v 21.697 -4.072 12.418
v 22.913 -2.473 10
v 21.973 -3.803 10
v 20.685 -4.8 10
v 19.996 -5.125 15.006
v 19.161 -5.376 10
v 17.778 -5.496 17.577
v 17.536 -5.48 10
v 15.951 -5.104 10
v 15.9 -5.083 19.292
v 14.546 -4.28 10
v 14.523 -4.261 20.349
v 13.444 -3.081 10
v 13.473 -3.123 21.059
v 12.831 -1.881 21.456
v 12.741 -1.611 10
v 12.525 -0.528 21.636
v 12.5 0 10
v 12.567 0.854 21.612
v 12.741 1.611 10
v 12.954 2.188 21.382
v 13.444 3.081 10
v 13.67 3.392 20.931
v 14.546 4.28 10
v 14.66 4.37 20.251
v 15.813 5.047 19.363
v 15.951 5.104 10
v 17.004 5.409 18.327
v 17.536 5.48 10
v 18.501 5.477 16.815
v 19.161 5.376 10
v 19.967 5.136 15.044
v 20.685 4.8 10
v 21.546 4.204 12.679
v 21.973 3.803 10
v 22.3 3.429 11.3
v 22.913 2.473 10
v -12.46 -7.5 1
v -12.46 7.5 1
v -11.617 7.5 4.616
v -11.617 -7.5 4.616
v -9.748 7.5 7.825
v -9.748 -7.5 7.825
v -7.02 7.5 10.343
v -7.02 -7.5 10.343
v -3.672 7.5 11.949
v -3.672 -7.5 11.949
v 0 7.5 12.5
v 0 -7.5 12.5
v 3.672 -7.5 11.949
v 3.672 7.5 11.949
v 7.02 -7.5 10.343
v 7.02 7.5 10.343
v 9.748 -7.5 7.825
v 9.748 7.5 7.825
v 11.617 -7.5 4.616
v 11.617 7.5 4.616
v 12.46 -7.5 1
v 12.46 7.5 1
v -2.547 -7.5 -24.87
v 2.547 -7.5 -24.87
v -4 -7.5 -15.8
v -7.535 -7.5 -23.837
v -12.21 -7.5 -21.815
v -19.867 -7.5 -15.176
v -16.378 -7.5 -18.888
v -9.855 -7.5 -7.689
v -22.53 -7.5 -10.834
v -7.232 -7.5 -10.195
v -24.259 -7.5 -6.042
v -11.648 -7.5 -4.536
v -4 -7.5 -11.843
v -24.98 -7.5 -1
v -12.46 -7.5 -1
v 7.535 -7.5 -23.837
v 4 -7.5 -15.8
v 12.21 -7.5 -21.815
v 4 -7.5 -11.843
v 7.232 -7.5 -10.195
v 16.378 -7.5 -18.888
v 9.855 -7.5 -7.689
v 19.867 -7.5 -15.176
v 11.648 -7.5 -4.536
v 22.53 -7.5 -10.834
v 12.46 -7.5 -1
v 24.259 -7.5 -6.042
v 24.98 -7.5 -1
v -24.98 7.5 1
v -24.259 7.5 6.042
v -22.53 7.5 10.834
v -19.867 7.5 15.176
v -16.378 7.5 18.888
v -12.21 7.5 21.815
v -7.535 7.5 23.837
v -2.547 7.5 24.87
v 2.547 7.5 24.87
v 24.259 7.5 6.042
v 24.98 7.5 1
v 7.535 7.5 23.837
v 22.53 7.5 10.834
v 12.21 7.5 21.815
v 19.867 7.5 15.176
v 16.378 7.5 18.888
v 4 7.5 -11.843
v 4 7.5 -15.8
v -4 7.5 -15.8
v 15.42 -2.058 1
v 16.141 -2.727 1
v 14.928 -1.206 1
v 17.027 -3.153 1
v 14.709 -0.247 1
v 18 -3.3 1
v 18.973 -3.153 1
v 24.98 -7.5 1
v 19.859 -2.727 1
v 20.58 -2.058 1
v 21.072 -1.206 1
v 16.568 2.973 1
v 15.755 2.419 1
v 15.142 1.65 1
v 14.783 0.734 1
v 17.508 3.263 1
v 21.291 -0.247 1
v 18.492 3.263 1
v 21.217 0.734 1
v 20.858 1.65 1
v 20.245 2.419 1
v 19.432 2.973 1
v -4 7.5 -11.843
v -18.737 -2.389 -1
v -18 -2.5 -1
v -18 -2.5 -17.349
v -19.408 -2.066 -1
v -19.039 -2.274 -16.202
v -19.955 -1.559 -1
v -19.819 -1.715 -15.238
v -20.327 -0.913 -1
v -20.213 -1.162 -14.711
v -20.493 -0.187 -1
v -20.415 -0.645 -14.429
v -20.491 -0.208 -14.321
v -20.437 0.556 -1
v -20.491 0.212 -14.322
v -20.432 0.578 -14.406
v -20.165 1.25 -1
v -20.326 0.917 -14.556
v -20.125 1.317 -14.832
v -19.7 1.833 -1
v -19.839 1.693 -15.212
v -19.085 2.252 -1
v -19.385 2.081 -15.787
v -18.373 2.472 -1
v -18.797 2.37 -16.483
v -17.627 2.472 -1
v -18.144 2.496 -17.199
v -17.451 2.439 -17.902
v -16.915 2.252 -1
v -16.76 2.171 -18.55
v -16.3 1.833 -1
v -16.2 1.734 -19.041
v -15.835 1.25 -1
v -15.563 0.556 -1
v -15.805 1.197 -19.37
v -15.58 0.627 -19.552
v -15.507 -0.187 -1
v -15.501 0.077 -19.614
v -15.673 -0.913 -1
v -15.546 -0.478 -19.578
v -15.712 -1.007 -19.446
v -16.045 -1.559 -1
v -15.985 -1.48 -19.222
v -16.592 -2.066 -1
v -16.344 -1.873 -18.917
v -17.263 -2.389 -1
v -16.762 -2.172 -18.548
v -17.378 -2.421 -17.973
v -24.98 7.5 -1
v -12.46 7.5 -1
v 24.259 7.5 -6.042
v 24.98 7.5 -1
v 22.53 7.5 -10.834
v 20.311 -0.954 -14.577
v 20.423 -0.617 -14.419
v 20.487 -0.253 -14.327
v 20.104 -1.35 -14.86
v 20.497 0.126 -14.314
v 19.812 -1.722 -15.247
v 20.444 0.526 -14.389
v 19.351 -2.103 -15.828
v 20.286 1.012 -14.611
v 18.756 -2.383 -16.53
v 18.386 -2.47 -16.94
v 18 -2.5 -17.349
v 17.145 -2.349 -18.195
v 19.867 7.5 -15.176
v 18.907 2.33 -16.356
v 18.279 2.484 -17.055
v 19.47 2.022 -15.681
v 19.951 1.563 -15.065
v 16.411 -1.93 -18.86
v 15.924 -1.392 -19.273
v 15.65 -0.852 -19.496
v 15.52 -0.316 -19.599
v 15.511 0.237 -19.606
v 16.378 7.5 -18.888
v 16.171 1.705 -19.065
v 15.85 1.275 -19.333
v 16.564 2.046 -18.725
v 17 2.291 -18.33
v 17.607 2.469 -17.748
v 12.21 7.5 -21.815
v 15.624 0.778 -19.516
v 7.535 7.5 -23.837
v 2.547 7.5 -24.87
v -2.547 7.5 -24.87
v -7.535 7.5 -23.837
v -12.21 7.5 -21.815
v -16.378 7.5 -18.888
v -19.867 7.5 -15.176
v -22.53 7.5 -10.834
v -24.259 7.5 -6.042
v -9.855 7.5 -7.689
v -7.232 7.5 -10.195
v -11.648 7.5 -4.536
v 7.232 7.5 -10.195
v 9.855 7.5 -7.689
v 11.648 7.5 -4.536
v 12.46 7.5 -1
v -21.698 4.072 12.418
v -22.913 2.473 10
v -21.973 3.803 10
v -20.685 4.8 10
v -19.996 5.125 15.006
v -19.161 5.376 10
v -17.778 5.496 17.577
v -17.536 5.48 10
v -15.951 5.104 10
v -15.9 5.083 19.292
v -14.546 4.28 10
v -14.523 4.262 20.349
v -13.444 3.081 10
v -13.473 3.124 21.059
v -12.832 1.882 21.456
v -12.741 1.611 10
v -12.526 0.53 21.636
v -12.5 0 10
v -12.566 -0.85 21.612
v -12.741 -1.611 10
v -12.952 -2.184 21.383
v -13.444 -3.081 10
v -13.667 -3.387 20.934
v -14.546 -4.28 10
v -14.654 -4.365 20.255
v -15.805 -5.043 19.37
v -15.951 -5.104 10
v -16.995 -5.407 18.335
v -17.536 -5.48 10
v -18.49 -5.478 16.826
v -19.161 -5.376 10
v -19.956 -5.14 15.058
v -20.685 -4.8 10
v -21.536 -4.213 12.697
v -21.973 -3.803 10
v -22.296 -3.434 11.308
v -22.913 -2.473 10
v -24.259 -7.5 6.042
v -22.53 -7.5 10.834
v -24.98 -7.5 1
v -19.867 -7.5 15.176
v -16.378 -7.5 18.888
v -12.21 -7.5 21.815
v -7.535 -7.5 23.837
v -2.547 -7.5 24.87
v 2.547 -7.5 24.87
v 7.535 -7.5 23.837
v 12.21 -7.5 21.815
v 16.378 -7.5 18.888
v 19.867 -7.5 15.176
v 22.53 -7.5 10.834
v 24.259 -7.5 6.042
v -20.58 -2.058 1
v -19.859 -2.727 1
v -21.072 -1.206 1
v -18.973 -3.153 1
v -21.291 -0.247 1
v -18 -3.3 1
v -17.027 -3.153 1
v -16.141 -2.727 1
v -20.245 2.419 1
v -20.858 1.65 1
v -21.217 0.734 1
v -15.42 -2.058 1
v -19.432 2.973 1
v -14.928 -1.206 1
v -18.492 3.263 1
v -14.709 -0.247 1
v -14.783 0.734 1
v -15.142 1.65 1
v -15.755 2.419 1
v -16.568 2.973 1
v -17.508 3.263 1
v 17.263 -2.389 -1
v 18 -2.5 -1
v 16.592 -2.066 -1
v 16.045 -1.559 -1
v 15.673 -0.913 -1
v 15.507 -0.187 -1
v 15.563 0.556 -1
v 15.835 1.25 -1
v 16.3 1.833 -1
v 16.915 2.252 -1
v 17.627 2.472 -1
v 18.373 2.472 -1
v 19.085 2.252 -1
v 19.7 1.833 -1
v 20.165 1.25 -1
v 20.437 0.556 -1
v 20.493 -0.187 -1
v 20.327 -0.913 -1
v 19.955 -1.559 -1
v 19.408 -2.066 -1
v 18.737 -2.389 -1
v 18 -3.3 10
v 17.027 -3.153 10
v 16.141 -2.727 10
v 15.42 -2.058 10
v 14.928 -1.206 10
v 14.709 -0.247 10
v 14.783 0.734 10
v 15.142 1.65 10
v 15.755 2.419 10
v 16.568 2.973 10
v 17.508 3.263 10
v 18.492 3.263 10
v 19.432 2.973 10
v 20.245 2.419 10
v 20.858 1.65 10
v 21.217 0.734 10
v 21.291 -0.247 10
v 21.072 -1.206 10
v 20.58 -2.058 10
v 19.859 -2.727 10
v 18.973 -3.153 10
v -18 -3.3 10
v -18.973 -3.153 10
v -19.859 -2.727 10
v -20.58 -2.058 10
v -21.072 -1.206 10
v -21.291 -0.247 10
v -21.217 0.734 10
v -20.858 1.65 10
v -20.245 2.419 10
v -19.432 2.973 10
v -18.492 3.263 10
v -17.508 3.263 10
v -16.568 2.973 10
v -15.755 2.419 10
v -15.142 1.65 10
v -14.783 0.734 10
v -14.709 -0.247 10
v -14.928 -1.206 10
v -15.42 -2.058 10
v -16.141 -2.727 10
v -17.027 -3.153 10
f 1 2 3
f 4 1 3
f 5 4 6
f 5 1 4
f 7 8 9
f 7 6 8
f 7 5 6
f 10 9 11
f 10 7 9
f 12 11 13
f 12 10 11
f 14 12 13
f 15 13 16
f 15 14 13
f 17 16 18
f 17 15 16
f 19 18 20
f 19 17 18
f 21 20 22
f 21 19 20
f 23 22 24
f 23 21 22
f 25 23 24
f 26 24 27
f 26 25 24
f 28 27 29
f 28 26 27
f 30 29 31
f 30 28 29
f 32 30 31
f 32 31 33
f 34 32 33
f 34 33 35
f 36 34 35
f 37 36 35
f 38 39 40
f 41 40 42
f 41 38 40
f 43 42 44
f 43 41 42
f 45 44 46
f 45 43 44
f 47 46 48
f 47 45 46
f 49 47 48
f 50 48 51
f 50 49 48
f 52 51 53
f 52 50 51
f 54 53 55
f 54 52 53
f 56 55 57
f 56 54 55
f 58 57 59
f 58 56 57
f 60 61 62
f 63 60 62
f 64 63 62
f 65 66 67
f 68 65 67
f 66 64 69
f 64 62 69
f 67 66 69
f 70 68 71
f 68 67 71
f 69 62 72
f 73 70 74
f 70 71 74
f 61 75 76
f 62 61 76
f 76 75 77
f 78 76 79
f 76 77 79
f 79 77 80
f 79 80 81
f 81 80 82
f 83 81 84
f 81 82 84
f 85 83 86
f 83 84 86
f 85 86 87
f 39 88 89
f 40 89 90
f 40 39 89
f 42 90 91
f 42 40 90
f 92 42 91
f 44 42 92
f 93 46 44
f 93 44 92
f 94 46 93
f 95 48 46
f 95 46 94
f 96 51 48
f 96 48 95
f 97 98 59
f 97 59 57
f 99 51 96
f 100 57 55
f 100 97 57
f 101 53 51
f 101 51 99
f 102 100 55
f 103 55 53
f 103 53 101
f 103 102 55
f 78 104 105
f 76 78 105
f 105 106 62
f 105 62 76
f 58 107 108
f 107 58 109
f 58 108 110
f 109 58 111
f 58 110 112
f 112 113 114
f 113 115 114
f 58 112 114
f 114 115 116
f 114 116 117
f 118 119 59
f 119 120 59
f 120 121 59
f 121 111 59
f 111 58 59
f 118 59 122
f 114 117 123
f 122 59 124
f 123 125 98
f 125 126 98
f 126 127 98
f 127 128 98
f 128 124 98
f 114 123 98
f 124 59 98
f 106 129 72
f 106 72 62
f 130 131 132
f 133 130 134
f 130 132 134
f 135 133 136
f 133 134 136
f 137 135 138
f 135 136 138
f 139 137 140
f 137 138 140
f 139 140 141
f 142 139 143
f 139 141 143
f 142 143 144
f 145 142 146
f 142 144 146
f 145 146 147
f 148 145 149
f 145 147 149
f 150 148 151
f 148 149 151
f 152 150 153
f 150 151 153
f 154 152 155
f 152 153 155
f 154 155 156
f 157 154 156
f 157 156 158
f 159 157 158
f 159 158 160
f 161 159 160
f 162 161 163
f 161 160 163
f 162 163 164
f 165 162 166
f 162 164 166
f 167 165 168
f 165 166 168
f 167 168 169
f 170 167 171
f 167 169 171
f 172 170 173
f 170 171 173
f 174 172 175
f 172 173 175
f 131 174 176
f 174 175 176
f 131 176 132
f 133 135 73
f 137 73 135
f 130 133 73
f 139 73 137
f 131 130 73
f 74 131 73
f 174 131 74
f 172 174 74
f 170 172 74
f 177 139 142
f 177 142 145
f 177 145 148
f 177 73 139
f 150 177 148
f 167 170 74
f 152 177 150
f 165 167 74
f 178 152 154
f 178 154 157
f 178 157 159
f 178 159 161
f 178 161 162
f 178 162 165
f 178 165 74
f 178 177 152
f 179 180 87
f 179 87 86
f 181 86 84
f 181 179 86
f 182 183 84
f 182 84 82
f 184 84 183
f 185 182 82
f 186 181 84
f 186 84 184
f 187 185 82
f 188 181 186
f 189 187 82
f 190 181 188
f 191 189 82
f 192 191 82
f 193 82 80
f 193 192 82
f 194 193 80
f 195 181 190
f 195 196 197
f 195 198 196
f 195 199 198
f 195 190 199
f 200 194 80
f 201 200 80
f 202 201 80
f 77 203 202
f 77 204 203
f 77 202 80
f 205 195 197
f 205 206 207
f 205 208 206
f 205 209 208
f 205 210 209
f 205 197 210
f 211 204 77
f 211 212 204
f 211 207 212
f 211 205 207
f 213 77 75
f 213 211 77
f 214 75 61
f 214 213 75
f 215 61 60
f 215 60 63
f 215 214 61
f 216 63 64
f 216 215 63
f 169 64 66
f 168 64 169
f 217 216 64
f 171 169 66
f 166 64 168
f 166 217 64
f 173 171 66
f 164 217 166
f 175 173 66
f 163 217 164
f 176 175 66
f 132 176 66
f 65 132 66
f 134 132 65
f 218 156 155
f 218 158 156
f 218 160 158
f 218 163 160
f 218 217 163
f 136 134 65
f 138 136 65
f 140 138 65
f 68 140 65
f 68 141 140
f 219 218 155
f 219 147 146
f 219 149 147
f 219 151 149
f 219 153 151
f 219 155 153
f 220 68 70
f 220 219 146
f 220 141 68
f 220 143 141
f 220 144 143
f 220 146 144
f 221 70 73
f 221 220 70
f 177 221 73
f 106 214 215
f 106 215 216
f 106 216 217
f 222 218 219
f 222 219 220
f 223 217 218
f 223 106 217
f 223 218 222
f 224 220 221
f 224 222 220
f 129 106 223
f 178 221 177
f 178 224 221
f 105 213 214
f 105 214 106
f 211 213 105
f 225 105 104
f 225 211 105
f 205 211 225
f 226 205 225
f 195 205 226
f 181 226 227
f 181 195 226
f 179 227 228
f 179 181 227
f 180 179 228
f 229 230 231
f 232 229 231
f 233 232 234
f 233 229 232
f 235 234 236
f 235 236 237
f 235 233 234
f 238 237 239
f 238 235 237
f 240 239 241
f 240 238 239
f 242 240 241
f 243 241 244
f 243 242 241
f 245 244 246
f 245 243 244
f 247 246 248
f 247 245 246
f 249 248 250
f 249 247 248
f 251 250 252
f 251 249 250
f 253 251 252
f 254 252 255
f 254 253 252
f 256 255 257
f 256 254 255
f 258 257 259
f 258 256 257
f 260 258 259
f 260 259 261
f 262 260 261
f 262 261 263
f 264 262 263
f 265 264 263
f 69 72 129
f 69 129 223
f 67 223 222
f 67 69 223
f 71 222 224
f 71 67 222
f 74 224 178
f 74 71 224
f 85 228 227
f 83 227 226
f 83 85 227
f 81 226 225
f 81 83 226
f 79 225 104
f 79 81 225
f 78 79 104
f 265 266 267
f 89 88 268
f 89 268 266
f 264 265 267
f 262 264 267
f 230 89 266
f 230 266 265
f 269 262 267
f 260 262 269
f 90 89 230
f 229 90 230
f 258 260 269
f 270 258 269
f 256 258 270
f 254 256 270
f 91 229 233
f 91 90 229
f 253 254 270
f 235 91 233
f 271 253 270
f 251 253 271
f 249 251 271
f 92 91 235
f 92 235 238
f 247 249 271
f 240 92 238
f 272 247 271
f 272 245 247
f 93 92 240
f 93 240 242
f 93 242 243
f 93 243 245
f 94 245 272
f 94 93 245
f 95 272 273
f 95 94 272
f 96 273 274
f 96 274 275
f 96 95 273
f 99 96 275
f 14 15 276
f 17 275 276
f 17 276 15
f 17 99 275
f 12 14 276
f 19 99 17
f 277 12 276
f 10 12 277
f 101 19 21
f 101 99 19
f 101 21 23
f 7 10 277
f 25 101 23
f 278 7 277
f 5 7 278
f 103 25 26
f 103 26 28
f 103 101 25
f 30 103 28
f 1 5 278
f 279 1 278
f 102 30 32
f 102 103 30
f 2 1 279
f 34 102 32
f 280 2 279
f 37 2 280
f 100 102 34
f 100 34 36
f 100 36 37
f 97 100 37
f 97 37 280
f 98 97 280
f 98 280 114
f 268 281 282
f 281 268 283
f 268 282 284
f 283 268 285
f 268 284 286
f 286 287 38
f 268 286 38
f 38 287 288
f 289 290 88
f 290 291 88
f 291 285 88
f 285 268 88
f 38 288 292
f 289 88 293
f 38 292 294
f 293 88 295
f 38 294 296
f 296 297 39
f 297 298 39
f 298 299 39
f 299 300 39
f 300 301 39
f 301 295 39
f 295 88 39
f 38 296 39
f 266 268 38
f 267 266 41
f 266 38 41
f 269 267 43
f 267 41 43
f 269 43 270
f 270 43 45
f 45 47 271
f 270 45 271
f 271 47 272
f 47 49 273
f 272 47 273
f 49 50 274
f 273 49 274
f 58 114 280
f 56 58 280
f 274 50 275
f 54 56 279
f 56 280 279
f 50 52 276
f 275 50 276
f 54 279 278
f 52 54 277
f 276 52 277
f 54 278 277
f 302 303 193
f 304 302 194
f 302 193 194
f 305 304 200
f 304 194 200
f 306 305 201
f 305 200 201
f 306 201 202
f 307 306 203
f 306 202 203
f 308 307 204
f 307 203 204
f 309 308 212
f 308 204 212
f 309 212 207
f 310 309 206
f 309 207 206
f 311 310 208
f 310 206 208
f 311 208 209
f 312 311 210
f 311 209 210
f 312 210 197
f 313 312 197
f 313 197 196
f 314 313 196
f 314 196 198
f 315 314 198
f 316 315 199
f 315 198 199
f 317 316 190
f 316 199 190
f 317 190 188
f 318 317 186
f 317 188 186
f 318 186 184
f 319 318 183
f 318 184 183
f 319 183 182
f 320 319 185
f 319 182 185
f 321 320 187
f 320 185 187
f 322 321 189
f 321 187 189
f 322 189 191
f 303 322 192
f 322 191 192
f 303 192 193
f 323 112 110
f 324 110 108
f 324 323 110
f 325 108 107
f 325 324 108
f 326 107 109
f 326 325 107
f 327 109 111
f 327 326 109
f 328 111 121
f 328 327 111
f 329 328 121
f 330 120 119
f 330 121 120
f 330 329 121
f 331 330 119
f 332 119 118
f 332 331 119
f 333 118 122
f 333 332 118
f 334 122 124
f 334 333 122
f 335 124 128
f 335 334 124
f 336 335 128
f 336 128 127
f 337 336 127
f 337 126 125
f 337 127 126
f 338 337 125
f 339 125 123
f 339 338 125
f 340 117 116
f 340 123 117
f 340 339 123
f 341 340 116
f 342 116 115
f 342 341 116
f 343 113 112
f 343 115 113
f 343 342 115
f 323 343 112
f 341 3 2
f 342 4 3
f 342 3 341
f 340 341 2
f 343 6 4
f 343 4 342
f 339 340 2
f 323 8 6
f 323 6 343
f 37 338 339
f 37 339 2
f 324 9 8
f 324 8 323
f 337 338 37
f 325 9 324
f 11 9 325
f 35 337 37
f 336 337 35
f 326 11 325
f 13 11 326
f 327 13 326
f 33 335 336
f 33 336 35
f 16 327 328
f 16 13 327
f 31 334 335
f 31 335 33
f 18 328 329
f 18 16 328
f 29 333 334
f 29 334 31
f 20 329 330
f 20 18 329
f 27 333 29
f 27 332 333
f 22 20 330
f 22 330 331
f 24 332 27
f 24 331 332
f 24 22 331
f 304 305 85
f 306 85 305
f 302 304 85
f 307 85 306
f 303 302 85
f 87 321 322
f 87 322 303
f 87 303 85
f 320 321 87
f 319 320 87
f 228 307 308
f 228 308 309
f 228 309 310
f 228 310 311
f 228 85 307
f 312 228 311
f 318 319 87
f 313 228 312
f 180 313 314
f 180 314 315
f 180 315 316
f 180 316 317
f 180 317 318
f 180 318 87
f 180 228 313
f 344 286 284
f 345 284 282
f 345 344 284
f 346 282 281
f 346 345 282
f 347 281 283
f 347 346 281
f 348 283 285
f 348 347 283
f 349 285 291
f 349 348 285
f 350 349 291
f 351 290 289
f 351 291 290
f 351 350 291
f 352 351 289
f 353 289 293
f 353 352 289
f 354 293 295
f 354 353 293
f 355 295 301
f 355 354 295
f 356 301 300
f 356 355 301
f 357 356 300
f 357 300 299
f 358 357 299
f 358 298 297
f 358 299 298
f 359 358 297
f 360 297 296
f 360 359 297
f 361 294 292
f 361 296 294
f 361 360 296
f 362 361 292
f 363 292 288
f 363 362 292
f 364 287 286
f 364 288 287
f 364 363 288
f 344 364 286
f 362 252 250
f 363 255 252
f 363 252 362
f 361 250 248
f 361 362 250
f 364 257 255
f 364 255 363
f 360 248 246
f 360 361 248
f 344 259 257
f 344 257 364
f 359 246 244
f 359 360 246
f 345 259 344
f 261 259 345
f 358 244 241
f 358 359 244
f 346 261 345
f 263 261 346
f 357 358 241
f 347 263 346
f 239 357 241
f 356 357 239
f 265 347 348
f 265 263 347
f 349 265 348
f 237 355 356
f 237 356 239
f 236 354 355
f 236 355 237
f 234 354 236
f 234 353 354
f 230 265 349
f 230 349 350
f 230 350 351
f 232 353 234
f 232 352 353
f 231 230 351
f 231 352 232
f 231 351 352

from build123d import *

# Parameters (mm, degrees)
SKETCH_1_R                  = 25
SKETCH_1_R_2                = 12.5
EXTRUDE_1_DEPTH             = 7.5
SKETCH_2_W                  = 55
SKETCH_2_H                  = 2
CUT_EXTRUDE_1_DEPTH         = 39.405728739
HOLE_WIZARD_M6_4_AT_2_COUNT = 2
HOLE_WIZARD_M6_4_AT_2_PITCH = 36
SKETCH_10_W                 = 2.5
SKETCH_10_H                 = 24
HOLE_WIZARD_M6_1_AT_2_COUNT = 2
HOLE_WIZARD_M6_1_AT_2_PITCH = 36
SKETCH_11_W                 = 8
SKETCH_11_H                 = 7
CUT_EXTRUDE_2_DEPTH         = 39.39270781


with BuildPart() as part:
    # 草圖1 → 填料-伸長1 (new, symmetric)
    with BuildSketch(Plane(origin=(0, 0, 0), x_dir=(1, 0, 0), z_dir=(0, 1, 0))):
        with Locations(Location((0, 0, 0), (0, 0, 270))):
            Circle(SKETCH_1_R)
        with Locations(Location((0, 0, 0), (0, 0, 270))):
            Circle(SKETCH_1_R_2, mode=Mode.SUBTRACT)
    extrude(amount=EXTRUDE_1_DEPTH, both=True)

    # 草圖2 → 除料-伸長1 (cut, through all)
    with BuildSketch(Plane(origin=(0, 7.5, 0), x_dir=(1, 0, 0), z_dir=(0, 1, 0))):
        Rectangle(SKETCH_2_W, SKETCH_2_H)
    extrude(amount=-CUT_EXTRUDE_1_DEPTH, mode=Mode.SUBTRACT)


with BuildPart() as cut_extrude_1_piece_1:
    # of the separate pieces the step leaves, piece 1, a body of its own (cut_extrude_1_pieces)
    add(part.part.solids().sort_by_distance((24.979991994, -7.5, -1))[0])

    # 草圖10 → M6 螺紋孔1 (revolve, cut)
    with BuildSketch(Plane(origin=(-18, 0, -1), x_dir=(0, -1, 0), z_dir=(1, 0, 0))):
        with Locations((1.25, 12)):
            Rectangle(SKETCH_10_W, SKETCH_10_H)
    hole_wizard_m6_1 = revolve(axis=Axis((-18, 0, 5.35), (0, 0, -1)), mode=Mode.SUBTRACT)

    # M6 螺紋孔1 at 2: M6 螺紋孔1 ×2
    with Locations(*[(i * HOLE_WIZARD_M6_1_AT_2_PITCH, 0, 0) for i in range(1, HOLE_WIZARD_M6_1_AT_2_COUNT)]):
        add(hole_wizard_m6_1, mode=Mode.SUBTRACT)

    # 草圖11 → 除料-伸長2 (cut, through all)
    with BuildSketch(Plane(origin=(0, 7.5, 0), x_dir=(1, 0, 0), z_dir=(0, 1, 0))):
        with Locations((0, 12.3)):
            Rectangle(SKETCH_11_W, SKETCH_11_H)
    extrude(amount=-CUT_EXTRUDE_2_DEPTH, mode=Mode.SUBTRACT)


with BuildPart() as cut_extrude_1_piece_2:
    # of the separate pieces the step leaves, piece 2, a body of its own (cut_extrude_1_pieces)
    add(part.part.solids().sort_by_distance((24.979991994, 7.5, 1))[0])

    # 草圖8 → M6 六角承窩頭蓋螺釘的柱孔4 (revolve, cut)
    with BuildSketch(Plane(origin=(-18, 0, 25), x_dir=(0, -1, 0), z_dir=(1, 0, 0))):
        Polygon((0, 0), (0, 42.349351573), (3.3, 42.349351573), (3.3, 15), (5.5, 15), (5.5, 0), align=None)
    hole_wizard_m6_4 = revolve(axis=Axis((-18, 0, 31.35), (0, 0, -1)), mode=Mode.SUBTRACT)

    # M6 六角承窩頭蓋螺釘的柱孔4 at 2: M6 六角承窩頭蓋螺釘的柱孔4 ×2
    with Locations(*[(i * HOLE_WIZARD_M6_4_AT_2_PITCH, 0, 0) for i in range(1, HOLE_WIZARD_M6_4_AT_2_COUNT)]):
        add(hole_wizard_m6_4, mode=Mode.SUBTRACT)


solid = Compound([cut_extrude_1_piece_1.part, cut_extrude_1_piece_2.part])
